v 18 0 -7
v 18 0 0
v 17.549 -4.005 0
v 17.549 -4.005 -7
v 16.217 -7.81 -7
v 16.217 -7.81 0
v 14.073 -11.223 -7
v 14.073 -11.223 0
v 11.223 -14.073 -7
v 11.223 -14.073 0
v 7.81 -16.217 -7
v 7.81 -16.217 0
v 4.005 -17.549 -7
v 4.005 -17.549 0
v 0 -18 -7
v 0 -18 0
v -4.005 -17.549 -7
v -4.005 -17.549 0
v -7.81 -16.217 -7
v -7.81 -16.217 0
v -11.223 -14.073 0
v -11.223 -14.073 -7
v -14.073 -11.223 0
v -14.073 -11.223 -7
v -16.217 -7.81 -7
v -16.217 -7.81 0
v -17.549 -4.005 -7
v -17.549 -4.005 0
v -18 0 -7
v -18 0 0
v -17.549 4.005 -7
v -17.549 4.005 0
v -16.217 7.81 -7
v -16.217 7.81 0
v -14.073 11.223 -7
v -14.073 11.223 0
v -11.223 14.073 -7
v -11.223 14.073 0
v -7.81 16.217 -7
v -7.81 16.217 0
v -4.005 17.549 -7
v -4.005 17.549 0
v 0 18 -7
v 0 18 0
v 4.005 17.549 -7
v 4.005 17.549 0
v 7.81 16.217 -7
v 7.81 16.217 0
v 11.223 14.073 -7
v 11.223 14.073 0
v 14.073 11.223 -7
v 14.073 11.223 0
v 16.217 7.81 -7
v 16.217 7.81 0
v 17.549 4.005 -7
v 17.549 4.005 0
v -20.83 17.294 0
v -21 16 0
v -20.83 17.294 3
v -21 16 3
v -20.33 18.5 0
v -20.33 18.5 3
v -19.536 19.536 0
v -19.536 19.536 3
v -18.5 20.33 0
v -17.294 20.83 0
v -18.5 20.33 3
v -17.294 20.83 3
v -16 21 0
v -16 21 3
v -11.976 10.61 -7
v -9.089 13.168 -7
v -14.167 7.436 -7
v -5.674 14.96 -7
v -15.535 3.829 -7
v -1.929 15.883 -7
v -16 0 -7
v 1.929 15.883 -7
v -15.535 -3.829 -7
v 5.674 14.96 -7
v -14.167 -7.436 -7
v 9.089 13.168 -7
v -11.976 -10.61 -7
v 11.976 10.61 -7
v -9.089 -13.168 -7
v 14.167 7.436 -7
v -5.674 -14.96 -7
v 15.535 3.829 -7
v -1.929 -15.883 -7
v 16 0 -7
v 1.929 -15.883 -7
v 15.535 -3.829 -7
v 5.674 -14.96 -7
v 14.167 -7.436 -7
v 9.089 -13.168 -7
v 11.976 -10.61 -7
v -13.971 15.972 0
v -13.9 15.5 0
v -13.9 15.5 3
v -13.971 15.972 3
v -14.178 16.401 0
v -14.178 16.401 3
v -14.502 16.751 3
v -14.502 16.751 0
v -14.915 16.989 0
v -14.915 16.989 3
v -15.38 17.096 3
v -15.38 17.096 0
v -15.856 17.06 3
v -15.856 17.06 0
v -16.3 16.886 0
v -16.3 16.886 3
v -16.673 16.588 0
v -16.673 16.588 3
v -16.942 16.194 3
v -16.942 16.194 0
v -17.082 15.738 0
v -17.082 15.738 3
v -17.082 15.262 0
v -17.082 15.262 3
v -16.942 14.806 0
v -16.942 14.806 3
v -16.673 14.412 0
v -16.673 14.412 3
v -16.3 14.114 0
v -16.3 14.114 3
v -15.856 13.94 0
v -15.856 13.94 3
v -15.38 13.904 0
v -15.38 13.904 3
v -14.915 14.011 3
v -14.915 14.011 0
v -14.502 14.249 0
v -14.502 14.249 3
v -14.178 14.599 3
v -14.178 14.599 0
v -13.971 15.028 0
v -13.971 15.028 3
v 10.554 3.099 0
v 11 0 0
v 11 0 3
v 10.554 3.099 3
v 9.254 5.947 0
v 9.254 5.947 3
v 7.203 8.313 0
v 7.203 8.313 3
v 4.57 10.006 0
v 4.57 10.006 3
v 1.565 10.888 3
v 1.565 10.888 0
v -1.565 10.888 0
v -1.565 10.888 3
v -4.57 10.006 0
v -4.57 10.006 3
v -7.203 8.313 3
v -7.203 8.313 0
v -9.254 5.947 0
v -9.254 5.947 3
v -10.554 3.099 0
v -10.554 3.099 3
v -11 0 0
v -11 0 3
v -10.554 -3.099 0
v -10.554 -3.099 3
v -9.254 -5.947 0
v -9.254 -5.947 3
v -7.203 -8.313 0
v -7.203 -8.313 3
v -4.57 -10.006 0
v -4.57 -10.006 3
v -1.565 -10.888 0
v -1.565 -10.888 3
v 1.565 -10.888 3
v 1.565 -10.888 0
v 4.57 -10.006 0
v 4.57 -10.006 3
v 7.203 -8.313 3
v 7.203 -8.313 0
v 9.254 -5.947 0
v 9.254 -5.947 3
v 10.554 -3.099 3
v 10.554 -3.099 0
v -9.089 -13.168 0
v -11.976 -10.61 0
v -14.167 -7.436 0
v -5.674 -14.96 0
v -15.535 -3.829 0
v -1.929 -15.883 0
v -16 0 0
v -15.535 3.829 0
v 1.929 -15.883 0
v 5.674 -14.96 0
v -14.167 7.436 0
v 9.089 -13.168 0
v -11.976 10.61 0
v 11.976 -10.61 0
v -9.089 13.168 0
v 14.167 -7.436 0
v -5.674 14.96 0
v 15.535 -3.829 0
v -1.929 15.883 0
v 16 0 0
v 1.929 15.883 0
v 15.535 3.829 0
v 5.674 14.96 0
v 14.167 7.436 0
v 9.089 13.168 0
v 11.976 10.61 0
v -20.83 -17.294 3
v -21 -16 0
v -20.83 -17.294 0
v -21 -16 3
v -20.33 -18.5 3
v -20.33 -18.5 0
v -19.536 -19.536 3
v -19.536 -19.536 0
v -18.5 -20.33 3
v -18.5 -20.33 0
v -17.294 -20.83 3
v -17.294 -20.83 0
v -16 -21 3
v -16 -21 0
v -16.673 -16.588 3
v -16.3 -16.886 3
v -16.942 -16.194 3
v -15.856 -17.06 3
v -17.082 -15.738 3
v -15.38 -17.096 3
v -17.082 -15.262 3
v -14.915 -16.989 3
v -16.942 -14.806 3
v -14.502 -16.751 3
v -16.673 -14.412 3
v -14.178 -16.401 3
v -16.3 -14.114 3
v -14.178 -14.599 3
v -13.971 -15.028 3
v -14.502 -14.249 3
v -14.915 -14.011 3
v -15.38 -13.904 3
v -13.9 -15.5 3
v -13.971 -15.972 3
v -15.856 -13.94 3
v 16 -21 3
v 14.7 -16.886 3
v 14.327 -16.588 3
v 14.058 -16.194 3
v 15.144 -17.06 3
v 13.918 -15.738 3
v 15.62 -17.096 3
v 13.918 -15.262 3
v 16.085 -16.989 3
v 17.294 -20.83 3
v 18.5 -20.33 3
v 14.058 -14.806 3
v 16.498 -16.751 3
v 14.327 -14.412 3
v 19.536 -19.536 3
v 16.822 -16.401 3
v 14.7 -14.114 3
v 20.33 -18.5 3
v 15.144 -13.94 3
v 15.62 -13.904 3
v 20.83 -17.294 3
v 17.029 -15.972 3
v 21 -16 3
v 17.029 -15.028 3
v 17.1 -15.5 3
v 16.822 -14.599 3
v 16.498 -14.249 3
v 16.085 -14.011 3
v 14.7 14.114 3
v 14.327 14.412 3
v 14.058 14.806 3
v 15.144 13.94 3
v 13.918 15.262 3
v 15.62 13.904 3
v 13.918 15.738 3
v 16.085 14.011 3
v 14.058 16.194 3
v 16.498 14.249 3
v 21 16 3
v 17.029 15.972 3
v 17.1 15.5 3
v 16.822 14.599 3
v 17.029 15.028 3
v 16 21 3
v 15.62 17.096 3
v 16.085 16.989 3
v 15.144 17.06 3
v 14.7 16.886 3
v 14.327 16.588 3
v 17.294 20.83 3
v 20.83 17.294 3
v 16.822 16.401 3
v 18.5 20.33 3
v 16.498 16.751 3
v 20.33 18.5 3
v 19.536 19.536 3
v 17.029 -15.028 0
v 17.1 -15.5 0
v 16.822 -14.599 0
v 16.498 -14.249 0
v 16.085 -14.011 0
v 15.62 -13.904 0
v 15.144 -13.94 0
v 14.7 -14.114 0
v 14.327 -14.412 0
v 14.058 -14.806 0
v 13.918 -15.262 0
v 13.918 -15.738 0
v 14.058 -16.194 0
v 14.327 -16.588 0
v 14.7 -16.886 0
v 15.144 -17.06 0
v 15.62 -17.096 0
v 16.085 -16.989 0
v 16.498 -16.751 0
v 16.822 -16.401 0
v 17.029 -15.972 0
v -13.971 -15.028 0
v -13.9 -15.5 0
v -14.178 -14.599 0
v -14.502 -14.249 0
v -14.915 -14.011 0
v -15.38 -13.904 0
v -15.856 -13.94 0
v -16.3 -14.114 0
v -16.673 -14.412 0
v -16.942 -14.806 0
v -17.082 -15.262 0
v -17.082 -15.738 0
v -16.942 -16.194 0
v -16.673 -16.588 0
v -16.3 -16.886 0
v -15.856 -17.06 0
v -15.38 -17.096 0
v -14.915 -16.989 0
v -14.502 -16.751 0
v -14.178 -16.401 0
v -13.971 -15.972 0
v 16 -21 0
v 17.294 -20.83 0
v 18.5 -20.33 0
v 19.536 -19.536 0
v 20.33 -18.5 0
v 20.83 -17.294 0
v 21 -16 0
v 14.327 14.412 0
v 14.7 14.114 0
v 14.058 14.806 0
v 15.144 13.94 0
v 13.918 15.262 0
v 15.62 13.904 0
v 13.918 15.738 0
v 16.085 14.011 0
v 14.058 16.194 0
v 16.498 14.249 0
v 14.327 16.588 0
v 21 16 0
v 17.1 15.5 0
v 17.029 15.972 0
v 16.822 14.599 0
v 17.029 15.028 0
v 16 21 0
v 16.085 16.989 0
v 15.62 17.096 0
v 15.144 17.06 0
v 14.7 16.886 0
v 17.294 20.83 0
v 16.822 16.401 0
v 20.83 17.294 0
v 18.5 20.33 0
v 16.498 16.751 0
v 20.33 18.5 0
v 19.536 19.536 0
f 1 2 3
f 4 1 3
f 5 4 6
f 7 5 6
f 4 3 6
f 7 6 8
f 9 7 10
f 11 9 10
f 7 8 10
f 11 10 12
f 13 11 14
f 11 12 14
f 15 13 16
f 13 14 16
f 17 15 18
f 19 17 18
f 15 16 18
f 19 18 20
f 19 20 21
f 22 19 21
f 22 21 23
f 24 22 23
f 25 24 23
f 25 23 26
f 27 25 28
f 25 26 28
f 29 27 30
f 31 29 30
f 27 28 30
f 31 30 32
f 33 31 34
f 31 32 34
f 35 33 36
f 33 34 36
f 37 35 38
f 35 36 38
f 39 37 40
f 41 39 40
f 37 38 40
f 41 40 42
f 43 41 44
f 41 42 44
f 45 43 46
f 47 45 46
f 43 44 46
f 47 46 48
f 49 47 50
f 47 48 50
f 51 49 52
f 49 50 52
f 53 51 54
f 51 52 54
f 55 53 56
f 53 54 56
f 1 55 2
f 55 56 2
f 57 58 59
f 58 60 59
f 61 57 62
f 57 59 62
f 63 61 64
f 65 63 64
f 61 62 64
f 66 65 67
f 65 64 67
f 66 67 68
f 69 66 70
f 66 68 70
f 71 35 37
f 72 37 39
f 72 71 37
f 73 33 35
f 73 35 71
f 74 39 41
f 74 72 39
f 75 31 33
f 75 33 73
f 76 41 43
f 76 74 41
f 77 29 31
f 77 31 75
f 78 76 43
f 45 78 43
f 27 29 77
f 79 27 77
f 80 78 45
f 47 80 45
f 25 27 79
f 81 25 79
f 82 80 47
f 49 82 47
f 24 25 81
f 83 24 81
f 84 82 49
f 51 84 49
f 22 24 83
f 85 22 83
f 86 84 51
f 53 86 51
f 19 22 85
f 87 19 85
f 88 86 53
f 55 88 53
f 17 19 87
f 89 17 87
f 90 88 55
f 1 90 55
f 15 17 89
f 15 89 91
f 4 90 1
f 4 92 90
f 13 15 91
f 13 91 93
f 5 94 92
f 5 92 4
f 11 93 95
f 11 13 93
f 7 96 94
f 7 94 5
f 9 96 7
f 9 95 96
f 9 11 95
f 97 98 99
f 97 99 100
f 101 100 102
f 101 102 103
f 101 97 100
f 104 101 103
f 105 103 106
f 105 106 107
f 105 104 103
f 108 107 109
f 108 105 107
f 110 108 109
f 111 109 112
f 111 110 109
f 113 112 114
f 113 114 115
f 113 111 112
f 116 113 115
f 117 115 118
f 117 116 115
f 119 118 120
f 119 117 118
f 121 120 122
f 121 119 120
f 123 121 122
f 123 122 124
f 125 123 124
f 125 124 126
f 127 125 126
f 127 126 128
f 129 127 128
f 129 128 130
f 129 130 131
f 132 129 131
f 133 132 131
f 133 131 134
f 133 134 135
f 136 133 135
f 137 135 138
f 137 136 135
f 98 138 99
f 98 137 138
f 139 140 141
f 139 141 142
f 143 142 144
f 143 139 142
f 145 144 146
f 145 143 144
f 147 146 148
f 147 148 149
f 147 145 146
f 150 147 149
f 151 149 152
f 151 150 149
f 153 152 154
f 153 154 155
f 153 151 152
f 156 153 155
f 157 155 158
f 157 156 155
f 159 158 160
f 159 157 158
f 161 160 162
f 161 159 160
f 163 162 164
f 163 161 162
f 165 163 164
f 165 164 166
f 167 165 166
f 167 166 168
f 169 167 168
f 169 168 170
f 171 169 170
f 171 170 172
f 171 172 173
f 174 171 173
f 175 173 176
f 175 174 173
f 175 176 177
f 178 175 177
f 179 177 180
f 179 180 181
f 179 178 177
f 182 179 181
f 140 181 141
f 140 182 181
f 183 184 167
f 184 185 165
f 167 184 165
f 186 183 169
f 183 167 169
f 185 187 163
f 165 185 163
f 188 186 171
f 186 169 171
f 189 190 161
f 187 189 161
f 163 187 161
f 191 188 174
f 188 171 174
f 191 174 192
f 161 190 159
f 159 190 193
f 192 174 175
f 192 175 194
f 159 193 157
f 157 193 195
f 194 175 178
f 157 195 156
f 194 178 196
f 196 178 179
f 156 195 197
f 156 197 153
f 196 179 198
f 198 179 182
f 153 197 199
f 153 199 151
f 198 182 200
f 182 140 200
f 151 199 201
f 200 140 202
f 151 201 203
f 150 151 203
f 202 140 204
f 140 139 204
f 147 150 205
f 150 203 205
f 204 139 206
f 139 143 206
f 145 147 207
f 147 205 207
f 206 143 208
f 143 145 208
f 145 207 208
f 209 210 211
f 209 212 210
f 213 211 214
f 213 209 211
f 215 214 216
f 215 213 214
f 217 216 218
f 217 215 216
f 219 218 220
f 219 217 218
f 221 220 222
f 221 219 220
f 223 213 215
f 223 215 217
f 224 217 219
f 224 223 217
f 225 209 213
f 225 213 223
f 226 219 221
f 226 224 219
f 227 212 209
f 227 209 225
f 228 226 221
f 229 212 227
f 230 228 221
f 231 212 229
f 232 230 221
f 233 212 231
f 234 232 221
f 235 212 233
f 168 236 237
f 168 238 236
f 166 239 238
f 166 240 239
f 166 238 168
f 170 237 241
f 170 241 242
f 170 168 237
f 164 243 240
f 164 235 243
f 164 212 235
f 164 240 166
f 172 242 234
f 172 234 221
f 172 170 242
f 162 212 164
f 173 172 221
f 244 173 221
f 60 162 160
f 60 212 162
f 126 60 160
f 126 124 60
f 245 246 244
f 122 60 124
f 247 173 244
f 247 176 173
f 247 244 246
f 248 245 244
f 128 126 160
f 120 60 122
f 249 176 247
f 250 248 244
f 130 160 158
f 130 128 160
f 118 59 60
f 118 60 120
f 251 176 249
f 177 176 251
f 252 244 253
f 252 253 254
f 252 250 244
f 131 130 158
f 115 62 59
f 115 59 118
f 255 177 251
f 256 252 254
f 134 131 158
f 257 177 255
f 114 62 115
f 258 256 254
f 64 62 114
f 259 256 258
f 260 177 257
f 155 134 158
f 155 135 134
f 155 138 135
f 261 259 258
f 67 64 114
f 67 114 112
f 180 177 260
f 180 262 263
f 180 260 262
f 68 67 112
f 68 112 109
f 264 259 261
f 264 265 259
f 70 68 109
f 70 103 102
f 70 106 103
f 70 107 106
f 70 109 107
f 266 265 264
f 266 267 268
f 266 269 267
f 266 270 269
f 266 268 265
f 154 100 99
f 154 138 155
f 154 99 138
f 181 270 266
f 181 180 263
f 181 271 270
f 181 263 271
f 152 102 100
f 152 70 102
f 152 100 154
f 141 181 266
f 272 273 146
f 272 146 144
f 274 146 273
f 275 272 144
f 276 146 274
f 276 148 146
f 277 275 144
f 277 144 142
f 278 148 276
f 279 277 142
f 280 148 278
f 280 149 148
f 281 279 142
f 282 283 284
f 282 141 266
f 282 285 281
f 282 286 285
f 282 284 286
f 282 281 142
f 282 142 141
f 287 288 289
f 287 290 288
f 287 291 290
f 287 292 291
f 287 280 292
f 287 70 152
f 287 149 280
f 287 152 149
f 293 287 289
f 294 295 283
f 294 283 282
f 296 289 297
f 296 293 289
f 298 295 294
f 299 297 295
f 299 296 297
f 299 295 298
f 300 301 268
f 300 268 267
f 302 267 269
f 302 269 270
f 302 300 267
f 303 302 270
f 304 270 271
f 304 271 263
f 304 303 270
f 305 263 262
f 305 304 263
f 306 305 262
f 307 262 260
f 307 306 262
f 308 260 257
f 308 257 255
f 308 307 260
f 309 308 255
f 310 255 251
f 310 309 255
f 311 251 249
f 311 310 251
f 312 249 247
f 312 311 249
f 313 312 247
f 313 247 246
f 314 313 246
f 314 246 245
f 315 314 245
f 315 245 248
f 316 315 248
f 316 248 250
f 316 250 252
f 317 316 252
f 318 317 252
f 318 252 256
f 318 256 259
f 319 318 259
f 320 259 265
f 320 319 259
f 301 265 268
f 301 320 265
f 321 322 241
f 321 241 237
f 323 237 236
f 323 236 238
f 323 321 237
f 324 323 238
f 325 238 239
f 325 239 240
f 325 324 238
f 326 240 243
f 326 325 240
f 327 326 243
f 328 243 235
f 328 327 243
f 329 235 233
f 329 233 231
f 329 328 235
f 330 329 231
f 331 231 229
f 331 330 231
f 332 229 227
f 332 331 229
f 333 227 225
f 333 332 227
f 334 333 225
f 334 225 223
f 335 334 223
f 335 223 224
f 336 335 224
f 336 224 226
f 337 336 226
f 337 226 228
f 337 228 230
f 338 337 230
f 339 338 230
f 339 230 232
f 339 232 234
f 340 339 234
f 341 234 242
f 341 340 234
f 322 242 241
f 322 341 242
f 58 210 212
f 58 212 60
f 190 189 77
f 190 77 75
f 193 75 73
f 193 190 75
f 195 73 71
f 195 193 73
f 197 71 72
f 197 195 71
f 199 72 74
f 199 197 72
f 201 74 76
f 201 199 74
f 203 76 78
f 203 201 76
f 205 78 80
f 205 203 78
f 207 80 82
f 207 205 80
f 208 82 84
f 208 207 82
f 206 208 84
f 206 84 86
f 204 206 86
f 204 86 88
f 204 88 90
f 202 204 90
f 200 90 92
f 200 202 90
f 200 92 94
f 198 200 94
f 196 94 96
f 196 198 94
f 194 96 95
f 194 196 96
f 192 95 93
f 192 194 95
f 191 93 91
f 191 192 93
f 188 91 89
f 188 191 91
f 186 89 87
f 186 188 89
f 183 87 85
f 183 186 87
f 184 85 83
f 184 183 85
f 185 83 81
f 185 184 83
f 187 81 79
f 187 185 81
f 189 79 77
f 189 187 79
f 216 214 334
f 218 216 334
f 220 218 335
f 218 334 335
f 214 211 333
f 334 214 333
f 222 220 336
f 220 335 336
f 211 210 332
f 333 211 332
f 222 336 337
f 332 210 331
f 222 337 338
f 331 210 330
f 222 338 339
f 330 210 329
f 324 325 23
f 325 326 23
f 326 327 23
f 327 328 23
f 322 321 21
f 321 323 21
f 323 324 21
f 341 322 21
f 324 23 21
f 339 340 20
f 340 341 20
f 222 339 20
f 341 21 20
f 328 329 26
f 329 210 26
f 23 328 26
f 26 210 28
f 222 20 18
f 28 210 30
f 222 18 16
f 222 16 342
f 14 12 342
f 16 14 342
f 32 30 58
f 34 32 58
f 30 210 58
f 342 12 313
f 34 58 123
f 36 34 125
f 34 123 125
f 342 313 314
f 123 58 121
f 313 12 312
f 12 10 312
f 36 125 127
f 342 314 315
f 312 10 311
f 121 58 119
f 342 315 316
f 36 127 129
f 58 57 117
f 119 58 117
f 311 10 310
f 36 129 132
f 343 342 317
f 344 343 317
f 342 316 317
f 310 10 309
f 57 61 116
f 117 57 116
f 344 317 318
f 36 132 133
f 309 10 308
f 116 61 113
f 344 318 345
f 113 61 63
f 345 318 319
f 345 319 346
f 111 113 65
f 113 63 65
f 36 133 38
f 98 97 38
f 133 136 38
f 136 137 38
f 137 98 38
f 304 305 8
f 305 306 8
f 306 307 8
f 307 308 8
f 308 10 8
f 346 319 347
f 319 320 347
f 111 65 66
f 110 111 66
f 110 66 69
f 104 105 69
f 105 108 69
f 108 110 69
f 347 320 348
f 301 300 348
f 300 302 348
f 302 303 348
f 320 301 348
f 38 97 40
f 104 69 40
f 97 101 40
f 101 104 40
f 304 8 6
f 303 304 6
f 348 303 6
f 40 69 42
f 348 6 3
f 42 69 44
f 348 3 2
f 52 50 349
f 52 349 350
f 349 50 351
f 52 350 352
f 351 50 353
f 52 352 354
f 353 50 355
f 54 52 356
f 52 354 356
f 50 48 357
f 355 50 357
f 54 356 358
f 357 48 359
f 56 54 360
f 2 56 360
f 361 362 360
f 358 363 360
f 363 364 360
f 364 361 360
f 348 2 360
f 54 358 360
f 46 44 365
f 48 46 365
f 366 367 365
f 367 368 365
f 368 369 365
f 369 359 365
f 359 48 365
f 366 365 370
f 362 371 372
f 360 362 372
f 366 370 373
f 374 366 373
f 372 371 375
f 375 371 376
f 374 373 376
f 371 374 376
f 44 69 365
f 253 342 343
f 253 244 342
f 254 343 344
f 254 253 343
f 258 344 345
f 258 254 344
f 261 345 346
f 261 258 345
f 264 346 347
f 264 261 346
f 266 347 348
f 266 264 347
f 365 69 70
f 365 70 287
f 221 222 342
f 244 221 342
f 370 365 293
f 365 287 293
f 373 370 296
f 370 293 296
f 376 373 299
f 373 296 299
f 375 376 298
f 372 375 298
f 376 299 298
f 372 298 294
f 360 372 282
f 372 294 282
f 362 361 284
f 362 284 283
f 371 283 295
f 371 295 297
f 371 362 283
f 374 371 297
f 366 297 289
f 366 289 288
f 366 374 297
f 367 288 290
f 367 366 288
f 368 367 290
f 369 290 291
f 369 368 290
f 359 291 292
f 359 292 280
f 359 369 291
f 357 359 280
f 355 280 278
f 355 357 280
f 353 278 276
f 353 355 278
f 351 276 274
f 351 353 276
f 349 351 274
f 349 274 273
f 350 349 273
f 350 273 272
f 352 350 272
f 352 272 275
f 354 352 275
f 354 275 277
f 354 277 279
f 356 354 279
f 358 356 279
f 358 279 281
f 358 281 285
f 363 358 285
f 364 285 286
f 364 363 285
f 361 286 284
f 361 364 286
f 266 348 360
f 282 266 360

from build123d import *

# Parameters (mm, degrees)
SKETCH_1_W      = 42
SKETCH_1_H      = 42
SKETCH_1_R      = 1.6
SKETCH_1_R_2    = 11
EXTRUDE_1_DEPTH = 3
FILLET_1_R      = 5
SKETCH_2_R      = 18
SKETCH_2_R_2    = 16
EXTRUDE_2_DEPTH = 7


with BuildPart() as part:
    # 草图1 → 凸台-拉伸1 (new body)
    with BuildSketch(Plane.XY):
        Rectangle(SKETCH_1_W, SKETCH_1_H)
        with Locations((-15.5, 15.5)):
            Circle(SKETCH_1_R, mode=Mode.SUBTRACT)
        with Locations((15.5, 15.5)):
            Circle(SKETCH_1_R, mode=Mode.SUBTRACT)
        with Locations((15.5, -15.5)):
            Circle(SKETCH_1_R, mode=Mode.SUBTRACT)
        with Locations((-15.5, -15.5)):
            Circle(SKETCH_1_R, mode=Mode.SUBTRACT)
        Circle(SKETCH_1_R_2, mode=Mode.SUBTRACT)
    extrude(amount=EXTRUDE_1_DEPTH)

    # 圆角1
    fillet_1_edges = [part.edges().sort_by_distance(p)[0] for p in [
        (-21, -21, 1.5),
        (-21, 21, 1.5),
        (21, 21, 1.5),
        (21, -21, 1.5),
    ]]
    fillet(fillet_1_edges, radius=FILLET_1_R)

    # 草图2 → 凸台-拉伸2 (add)
    with BuildSketch(Plane(origin=(0, 0, 0), x_dir=(-1, 0, 0), z_dir=(0, 0, -1))):
        with Locations(Location((0, 0, 0), (0, 0, 180))):
            Circle(SKETCH_2_R)
        Circle(SKETCH_2_R_2, mode=Mode.SUBTRACT)
    extrude(amount=EXTRUDE_2_DEPTH)


solid = part.part
